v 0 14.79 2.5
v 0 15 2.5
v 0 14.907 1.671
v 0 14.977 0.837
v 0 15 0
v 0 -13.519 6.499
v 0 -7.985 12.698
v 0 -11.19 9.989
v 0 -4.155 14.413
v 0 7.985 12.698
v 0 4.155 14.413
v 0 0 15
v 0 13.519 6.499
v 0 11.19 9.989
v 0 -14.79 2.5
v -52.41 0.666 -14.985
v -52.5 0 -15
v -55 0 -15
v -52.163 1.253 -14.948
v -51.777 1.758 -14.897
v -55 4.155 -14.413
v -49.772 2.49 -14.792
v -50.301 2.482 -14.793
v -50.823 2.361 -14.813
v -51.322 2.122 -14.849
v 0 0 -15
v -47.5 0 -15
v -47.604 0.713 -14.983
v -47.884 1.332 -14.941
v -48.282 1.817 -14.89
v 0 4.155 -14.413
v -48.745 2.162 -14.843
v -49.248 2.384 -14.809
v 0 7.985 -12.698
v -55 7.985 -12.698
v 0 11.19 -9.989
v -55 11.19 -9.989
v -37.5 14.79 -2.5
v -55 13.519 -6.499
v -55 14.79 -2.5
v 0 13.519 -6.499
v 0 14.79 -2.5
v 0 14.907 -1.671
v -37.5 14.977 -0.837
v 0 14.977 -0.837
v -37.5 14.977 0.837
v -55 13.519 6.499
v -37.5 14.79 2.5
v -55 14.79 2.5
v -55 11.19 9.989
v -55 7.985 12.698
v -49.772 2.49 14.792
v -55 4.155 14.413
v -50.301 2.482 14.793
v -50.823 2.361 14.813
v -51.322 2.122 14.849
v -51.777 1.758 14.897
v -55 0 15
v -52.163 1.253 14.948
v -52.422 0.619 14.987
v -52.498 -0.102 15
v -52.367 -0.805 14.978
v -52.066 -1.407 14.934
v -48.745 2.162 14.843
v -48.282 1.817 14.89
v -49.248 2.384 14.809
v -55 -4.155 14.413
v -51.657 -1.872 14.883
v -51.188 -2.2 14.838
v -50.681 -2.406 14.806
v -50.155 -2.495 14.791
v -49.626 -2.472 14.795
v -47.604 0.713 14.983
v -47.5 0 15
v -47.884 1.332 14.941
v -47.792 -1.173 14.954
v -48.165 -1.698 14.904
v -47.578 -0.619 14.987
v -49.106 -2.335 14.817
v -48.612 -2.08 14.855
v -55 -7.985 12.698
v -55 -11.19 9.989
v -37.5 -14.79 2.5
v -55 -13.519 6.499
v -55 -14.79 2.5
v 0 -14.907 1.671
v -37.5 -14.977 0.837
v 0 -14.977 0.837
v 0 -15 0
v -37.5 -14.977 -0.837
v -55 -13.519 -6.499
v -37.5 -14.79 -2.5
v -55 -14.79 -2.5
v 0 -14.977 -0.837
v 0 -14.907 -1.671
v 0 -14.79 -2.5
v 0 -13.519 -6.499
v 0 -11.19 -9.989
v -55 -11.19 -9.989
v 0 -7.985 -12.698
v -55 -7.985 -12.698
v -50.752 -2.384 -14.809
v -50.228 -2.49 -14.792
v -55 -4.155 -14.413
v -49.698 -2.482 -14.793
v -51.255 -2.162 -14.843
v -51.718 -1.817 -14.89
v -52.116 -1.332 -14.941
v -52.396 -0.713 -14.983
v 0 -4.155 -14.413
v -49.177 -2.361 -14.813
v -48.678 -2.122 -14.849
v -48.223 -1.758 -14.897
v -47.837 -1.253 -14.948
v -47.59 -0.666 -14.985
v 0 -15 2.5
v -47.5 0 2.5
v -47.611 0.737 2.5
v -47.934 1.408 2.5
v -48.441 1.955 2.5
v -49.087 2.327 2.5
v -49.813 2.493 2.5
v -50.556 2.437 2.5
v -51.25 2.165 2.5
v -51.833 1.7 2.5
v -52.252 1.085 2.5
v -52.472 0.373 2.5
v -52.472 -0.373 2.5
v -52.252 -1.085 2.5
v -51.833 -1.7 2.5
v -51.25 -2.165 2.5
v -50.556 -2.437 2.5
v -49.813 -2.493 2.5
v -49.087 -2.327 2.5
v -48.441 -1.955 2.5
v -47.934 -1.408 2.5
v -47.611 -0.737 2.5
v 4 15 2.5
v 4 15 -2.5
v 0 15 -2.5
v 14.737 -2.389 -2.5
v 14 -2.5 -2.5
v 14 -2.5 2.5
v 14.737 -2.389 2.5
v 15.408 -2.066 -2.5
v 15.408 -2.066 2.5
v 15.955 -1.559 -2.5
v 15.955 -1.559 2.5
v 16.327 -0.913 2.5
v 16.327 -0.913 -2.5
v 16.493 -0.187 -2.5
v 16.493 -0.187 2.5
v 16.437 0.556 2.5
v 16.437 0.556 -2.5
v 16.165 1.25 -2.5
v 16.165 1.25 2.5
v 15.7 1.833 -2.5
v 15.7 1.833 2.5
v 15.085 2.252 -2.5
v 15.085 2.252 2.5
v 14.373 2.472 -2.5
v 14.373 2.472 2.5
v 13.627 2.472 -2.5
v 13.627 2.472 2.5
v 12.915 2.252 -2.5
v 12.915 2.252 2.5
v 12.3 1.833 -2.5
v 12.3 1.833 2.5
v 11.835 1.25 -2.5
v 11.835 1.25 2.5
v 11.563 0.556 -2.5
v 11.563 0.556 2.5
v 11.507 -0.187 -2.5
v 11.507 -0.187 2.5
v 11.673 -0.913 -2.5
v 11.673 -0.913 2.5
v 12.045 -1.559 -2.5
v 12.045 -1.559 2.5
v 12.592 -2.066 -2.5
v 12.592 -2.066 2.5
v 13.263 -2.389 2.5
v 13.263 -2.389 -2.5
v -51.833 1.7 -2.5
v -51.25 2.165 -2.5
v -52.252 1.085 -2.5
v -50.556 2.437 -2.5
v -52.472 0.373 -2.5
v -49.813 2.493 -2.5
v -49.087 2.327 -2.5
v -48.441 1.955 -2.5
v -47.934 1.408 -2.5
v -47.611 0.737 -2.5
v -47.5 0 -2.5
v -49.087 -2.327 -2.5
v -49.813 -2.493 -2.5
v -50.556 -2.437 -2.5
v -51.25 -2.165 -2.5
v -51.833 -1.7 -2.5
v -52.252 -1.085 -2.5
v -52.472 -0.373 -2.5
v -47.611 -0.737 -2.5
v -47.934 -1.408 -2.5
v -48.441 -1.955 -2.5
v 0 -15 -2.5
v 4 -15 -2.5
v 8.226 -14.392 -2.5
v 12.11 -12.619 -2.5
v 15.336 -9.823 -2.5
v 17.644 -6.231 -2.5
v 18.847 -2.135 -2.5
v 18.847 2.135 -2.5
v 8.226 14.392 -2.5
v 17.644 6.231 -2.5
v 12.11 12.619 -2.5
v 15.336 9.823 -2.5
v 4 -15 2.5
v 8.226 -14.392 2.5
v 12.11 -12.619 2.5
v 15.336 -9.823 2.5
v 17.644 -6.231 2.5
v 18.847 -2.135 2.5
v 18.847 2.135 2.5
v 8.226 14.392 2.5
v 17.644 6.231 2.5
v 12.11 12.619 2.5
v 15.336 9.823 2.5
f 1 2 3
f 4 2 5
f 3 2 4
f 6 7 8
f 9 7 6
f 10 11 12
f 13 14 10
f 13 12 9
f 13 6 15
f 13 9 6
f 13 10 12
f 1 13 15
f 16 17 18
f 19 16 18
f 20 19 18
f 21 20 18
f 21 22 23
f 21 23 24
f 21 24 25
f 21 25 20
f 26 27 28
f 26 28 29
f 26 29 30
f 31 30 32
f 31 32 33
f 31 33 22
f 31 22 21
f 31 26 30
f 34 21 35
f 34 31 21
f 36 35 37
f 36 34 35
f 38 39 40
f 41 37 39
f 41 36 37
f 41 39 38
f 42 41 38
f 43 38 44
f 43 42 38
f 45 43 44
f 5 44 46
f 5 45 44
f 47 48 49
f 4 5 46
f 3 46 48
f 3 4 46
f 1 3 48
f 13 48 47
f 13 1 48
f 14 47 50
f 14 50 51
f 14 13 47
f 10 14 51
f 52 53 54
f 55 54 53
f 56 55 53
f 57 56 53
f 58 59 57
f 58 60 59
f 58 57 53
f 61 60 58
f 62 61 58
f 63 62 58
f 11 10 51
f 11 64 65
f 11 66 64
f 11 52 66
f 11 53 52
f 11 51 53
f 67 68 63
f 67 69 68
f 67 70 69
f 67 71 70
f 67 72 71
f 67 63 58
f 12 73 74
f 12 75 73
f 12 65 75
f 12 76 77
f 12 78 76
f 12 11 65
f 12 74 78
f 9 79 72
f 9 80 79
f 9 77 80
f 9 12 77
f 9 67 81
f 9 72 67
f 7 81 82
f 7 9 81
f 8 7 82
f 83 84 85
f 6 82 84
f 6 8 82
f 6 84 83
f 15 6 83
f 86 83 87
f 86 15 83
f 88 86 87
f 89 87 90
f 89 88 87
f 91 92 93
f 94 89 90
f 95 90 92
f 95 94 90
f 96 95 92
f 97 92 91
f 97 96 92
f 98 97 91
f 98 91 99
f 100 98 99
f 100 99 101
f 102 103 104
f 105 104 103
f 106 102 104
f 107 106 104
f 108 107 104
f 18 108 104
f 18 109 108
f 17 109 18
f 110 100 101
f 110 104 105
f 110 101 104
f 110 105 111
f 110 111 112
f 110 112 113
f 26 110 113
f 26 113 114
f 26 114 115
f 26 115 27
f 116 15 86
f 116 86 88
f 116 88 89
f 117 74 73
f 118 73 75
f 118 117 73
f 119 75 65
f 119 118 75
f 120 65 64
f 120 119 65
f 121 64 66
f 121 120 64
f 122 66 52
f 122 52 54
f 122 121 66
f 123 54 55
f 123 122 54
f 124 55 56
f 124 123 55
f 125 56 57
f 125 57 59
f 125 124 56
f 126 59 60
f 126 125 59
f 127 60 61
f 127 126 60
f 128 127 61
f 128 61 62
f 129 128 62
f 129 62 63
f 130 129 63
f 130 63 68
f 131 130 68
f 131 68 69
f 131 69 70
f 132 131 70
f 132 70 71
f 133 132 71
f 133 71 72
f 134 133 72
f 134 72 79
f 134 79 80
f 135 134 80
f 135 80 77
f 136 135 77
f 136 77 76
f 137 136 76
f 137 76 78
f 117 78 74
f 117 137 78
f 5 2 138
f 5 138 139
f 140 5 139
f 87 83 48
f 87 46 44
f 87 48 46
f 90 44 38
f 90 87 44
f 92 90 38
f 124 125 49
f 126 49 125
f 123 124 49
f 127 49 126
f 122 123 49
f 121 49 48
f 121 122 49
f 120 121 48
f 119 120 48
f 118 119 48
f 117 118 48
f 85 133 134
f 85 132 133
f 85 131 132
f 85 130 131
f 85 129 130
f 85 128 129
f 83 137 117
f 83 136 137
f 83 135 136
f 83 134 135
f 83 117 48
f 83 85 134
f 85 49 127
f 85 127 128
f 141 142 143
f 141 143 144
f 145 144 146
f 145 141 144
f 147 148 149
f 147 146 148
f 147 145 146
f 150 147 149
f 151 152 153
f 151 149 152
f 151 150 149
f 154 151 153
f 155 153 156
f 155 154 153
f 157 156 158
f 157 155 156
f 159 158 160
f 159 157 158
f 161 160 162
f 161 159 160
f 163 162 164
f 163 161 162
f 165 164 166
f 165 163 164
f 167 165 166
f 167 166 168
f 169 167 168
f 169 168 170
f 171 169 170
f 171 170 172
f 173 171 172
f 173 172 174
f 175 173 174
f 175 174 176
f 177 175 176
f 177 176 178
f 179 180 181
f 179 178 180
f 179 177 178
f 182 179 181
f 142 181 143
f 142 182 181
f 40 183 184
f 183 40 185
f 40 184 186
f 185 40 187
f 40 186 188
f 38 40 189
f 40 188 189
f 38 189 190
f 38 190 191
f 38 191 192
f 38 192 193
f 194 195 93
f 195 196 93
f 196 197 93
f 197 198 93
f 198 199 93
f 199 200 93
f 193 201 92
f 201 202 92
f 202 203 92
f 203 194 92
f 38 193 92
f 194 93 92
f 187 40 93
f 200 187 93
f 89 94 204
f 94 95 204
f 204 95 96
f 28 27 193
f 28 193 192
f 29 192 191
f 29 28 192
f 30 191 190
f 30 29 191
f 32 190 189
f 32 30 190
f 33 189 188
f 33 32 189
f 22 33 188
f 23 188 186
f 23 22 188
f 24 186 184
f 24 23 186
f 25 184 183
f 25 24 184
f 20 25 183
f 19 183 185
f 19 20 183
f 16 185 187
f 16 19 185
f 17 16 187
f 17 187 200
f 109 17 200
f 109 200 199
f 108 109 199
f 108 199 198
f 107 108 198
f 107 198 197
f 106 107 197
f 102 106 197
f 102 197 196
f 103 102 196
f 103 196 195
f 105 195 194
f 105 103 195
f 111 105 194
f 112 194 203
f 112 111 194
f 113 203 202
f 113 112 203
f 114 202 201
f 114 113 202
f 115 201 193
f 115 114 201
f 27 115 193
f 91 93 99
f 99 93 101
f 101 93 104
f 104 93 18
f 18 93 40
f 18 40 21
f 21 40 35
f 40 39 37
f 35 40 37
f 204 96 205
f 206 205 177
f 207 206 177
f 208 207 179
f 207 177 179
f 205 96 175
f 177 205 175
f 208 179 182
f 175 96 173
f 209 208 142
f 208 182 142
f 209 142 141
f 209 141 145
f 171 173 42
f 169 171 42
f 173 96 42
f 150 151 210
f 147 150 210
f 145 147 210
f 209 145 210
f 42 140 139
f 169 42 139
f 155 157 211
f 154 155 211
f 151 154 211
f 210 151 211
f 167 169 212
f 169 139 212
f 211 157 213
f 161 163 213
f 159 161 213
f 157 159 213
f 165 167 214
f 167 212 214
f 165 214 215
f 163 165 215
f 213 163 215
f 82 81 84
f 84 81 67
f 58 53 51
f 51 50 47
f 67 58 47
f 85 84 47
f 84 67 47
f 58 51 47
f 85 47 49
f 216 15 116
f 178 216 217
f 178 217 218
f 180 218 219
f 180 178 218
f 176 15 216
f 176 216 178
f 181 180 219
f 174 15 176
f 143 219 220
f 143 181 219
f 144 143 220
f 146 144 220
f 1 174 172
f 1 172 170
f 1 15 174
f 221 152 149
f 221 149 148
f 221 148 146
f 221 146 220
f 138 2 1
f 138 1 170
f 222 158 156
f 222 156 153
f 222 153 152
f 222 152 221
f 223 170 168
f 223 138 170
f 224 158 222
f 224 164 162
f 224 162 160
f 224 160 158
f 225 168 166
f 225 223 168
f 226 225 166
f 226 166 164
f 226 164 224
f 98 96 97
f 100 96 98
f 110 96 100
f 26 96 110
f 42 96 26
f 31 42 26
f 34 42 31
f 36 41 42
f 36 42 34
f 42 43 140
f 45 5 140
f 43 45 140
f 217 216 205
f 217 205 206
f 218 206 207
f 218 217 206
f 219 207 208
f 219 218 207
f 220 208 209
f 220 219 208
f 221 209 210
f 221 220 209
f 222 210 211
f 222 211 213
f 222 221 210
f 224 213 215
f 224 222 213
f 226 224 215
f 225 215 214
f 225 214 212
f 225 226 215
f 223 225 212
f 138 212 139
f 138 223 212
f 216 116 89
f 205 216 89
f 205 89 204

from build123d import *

# Parameters (mm, degrees)
SKETCH2_R               = 15
BOSS_EXTRUDE1_DEPTH     = 55
CUT_EXTRUDE1_DEPTH      = 59.949130613
CUT_EXTRUDE1_DEPTH_BACK = 59.949130613
SKETCH3_W               = 17.5
SKETCH3_H               = 5
CUT_EXTRUDE2_DEPTH      = 59.949130613
CUT_EXTRUDE2_DEPTH_BACK = 59.949130613
SKETCH6_R               = 2.5
SKETCH7_W               = 5
SKETCH7_H               = 30
BOSS_EXTRUDE2_DEPTH     = 4
BOSS_EXTRUDE3_DEPTH     = 5
CUT_EXTRUDE3_DEPTH      = 60.634302356
CUT_EXTRUDE3_DEPTH_BACK = 60.634302356
SKETCH9_R               = 2.5


with BuildPart() as part:
    # Sketch2 → Boss-Extrude1 (new body)
    with BuildSketch(Plane(origin=(0, 0, 0), x_dir=(0, 0, -1), z_dir=(1, 0, 0))):
        Circle(SKETCH2_R)
    extrude(amount=-BOSS_EXTRUDE1_DEPTH)

    # Sketch3 → Cut-Extrude1 (cut, two sides: drawn at the far end of the back side and taken through both)
    with BuildSketch(Plane(origin=(0, 0, 0), x_dir=(1, 0, 0), z_dir=(0, 1, 0)).offset(-CUT_EXTRUDE1_DEPTH_BACK)):
        with Locations((-46.25, 0)):
            Rectangle(SKETCH3_W, SKETCH3_H)
    extrude(amount=CUT_EXTRUDE1_DEPTH + CUT_EXTRUDE1_DEPTH_BACK, mode=Mode.SUBTRACT)

    # Sketch6 → Cut-Extrude2 (cut, two sides: drawn at the far end of the back side and taken through both)
    with BuildSketch(Plane.XY.offset(-CUT_EXTRUDE2_DEPTH_BACK)):
        with Locations((-50, 0)):
            Circle(SKETCH6_R)
    extrude(amount=CUT_EXTRUDE2_DEPTH + CUT_EXTRUDE2_DEPTH_BACK, mode=Mode.SUBTRACT)

    # Sketch7 → Boss-Extrude2 (add)
    with BuildSketch(Plane(origin=(0, 0, 0), x_dir=(0, 0, -1), z_dir=(1, 0, 0))):
        Rectangle(SKETCH7_W, SKETCH7_H)
    extrude(amount=BOSS_EXTRUDE2_DEPTH)

    # Sketch8 → Boss-Extrude3 (add)
    with BuildSketch(Plane.XY.offset(2.5)):
        with BuildLine():
            Line((4, 15), (4, -15))
            ThreePointArc((4, -15), (19, 0), (4, 15))
        make_face()
    extrude(amount=-BOSS_EXTRUDE3_DEPTH)

    # Sketch9 → Cut-Extrude3 (cut, two sides: drawn at the far end of the back side and taken through both)
    with BuildSketch(Plane.XY.offset(2.5).offset(-CUT_EXTRUDE3_DEPTH_BACK)):
        with Locations(Location((14, 0, 0), (0, 0, 270))):
            Circle(SKETCH9_R)
    extrude(amount=CUT_EXTRUDE3_DEPTH + CUT_EXTRUDE3_DEPTH_BACK, mode=Mode.SUBTRACT)


solid = part.part
